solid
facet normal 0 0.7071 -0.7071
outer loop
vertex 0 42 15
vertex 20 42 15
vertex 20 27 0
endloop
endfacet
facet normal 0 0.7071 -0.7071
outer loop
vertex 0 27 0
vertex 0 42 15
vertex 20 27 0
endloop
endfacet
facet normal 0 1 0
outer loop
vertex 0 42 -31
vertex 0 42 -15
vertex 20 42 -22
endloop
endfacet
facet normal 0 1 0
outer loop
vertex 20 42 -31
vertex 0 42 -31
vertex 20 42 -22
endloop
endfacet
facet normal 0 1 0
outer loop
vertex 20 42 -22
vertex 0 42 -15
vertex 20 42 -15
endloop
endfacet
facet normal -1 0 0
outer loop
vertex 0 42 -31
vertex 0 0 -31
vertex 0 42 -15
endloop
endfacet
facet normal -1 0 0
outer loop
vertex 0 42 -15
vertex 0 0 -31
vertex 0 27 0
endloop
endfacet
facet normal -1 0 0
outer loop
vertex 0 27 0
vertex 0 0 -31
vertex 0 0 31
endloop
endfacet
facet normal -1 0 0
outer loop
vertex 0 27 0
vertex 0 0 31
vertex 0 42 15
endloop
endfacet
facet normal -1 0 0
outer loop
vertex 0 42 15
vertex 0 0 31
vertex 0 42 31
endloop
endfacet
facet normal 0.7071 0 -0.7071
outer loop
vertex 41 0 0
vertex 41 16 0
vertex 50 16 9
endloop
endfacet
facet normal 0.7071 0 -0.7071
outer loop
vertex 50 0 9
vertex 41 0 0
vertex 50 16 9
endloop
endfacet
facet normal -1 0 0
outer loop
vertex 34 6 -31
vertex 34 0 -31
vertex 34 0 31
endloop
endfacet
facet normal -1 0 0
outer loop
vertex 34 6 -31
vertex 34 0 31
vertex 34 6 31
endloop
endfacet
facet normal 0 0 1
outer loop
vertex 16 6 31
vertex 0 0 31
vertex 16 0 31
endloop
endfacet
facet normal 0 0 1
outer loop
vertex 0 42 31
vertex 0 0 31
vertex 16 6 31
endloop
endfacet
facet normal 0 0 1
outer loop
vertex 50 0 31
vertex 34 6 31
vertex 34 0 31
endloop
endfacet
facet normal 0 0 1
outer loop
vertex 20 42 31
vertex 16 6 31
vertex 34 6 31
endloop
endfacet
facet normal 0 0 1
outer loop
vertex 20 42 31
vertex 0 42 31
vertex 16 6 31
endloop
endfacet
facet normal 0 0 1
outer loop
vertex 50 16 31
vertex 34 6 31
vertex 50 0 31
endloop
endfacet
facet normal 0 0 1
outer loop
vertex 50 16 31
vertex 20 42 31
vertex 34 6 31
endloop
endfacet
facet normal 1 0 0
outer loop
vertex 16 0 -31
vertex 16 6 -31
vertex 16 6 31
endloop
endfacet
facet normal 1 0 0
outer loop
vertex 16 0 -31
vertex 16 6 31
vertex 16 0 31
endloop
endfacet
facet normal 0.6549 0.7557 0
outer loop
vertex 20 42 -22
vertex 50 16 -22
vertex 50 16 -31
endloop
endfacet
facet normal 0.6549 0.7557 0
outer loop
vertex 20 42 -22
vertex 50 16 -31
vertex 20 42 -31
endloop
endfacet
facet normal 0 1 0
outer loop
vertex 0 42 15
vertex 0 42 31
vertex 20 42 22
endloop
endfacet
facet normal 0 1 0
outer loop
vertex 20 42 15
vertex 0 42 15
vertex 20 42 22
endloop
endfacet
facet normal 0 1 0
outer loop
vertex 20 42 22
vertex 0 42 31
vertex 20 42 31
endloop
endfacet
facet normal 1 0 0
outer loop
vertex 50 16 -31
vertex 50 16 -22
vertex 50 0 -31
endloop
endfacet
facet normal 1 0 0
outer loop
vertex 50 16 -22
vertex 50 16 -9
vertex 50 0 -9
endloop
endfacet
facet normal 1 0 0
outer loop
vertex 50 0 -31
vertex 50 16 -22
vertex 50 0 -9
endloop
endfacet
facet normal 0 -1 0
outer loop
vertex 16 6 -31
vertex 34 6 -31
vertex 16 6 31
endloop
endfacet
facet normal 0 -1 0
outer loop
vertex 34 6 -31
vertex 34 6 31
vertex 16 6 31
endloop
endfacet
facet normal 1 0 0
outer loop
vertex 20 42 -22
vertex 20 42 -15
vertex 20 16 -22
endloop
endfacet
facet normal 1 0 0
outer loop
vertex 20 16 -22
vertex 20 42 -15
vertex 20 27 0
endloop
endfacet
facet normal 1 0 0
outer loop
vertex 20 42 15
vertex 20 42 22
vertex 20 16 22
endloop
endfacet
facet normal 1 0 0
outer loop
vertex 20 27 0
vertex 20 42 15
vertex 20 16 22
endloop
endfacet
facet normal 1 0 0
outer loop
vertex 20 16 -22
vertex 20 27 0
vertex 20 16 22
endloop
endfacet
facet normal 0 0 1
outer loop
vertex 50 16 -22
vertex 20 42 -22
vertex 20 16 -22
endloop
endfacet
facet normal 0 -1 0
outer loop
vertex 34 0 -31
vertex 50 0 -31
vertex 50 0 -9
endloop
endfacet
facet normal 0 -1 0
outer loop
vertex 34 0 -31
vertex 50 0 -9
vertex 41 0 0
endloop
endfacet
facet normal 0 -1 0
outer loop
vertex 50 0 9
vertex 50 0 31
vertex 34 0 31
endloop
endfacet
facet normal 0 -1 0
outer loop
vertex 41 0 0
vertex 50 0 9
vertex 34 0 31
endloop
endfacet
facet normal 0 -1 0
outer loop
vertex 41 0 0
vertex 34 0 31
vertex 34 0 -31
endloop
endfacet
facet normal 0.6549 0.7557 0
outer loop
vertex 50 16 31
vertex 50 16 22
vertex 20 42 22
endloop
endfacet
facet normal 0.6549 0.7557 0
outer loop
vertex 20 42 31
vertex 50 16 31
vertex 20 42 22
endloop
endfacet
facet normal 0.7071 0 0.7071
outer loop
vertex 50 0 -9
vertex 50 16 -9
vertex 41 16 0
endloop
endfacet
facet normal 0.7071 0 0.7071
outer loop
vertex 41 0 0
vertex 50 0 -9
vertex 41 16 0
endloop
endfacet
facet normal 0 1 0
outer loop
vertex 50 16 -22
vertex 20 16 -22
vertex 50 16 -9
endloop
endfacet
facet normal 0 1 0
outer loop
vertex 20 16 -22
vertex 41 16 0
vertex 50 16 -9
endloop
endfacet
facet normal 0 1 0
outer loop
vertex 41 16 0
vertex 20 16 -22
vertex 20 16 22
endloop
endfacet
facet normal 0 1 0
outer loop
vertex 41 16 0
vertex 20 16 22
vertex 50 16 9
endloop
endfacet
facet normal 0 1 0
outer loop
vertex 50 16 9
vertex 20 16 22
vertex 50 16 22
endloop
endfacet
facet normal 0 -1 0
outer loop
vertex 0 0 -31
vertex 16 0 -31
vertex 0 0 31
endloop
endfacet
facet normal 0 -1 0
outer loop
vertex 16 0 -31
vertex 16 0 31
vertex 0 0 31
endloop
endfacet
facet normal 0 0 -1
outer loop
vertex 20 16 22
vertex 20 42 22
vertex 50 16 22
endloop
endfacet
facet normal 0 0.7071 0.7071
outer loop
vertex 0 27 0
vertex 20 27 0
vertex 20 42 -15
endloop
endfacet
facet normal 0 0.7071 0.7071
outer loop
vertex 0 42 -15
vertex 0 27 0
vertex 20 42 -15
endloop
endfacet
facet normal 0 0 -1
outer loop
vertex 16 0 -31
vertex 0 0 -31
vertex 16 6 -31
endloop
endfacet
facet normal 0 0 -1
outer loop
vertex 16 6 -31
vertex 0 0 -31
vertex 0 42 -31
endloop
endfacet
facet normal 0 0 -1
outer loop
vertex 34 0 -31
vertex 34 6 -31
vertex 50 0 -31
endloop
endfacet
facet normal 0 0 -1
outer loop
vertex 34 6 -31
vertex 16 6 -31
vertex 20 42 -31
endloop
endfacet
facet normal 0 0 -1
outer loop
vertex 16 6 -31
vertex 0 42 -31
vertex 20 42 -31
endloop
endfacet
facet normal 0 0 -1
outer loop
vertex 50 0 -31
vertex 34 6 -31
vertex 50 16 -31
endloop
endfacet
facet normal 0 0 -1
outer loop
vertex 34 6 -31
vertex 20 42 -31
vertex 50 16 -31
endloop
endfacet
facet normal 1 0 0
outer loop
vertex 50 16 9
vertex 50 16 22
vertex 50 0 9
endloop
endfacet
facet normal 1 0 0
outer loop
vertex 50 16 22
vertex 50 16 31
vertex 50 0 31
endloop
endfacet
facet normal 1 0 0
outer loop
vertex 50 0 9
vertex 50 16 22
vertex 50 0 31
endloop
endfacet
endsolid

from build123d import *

# Parameters (mm, degrees)
BOSS_EXTRUDE1_DEPTH = 31
BOSS_EXTRUDE2_START = 22
BOSS_EXTRUDE2_DEPTH = 9
BOSS_EXTRUDE3_START = -22
BOSS_EXTRUDE3_DEPTH = 9
CUT_EXTRUDE1_DEPTH  = 39
CUT_EXTRUDE2_DEPTH  = 39


with BuildPart() as part:
    # Sketch1 → Boss-Extrude1 (new, symmetric)
    with BuildSketch(Plane.XY):
        Polygon((20, 42), (0, 42), (0, 0), (16, 0), (16, 6), (34, 6), (34, 0), (50, 0), (50, 16), (20, 16), align=None)
    extrude(amount=BOSS_EXTRUDE1_DEPTH, both=True)

    # Sketch1<3> → Boss-Extrude2 (add)
    with BuildSketch(Plane.XY.offset(BOSS_EXTRUDE2_START)):
        Polygon((50, 16), (20, 42), (20, 16), align=None)
    extrude(amount=BOSS_EXTRUDE2_DEPTH)

    # Sketch1<5> → Boss-Extrude3 (add)
    with BuildSketch(Plane.XY.offset(BOSS_EXTRUDE3_START)):
        Polygon((50, 16), (20, 42), (20, 16), align=None)
    extrude(amount=-BOSS_EXTRUDE3_DEPTH)

    # Sketch3 → Cut-Extrude1 (cut)
    with BuildSketch(Plane(origin=(20, 0, 0), x_dir=(0, 0, -1), z_dir=(1, 0, 0))):
        Polygon((-15, 42), (0, 27), (15, 42), align=None)
    extrude(amount=-CUT_EXTRUDE1_DEPTH, mode=Mode.SUBTRACT)

    # Sketch4 → Cut-Extrude2 (cut)
    with BuildSketch(Plane(origin=(0, 16, 0), x_dir=(1, 0, 0), z_dir=(0, 1, 0))):
        Polygon((50, 9), (41, 0), (50, -9), align=None)
    extrude(amount=-CUT_EXTRUDE2_DEPTH, mode=Mode.SUBTRACT)


solid = part.part
